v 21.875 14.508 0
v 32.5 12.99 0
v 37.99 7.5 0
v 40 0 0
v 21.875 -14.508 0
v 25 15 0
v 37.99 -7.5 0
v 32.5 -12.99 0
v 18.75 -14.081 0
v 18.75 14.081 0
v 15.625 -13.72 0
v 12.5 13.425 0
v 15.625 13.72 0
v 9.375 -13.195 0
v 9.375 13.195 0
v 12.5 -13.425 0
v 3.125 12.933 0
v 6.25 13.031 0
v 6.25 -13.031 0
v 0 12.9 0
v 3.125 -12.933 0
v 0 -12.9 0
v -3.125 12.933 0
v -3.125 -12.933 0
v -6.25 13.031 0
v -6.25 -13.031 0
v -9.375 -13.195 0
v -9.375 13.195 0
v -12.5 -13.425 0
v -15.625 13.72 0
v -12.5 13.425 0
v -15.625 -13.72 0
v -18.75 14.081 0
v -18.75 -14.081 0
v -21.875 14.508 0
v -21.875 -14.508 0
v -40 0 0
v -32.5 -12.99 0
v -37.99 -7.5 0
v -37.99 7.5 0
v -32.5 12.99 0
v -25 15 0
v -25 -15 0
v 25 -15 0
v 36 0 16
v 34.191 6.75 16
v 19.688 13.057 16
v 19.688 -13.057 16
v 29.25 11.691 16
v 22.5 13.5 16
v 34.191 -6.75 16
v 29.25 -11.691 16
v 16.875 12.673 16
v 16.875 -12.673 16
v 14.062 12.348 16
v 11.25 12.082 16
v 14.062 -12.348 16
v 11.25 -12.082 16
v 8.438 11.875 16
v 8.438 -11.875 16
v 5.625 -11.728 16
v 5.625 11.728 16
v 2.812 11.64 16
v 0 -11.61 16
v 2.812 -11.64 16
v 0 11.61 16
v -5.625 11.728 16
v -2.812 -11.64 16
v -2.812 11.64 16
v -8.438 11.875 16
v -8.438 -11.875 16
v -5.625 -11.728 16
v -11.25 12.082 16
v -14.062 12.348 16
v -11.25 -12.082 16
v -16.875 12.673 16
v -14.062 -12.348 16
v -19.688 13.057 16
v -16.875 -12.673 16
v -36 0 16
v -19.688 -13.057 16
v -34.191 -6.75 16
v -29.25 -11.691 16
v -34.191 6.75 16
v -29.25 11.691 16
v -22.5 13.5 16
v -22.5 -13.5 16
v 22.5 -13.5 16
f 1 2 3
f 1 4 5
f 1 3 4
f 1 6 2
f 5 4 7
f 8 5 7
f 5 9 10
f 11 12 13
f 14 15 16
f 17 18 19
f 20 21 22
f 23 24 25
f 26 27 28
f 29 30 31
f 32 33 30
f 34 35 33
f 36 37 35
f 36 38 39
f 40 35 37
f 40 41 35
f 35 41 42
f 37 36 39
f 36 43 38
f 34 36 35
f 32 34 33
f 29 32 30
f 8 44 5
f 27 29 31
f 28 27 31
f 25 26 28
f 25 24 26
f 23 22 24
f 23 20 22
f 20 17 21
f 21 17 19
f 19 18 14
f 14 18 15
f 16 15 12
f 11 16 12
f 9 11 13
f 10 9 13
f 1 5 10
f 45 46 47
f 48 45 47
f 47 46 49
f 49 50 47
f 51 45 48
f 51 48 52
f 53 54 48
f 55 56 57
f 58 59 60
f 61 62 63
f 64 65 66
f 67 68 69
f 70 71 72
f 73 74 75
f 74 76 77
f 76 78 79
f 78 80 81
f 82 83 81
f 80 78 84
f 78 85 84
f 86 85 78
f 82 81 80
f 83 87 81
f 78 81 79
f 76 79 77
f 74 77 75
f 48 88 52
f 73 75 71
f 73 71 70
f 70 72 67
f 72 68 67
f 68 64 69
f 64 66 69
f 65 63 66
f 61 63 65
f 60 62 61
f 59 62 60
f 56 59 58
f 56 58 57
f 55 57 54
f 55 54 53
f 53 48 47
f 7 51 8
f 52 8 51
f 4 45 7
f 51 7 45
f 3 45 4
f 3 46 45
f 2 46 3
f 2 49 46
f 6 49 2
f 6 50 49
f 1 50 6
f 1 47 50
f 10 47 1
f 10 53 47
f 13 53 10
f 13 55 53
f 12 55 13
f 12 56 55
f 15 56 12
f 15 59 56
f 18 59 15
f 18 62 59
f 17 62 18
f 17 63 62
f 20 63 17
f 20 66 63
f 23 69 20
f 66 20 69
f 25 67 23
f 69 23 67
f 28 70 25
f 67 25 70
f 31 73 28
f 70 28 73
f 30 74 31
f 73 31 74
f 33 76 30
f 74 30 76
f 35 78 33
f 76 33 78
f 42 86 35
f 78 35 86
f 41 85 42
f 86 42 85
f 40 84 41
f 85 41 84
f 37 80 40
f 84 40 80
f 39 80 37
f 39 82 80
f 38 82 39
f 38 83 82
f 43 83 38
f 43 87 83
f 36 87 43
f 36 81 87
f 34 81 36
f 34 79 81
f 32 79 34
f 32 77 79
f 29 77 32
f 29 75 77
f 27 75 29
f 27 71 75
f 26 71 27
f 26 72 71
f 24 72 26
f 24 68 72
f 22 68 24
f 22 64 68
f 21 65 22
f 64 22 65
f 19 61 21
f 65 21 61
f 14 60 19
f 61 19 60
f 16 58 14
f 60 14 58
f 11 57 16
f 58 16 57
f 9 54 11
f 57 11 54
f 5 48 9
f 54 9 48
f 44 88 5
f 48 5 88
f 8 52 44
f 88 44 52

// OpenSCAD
$fn = 32;

// ----------------------------------------------------------------------
// Handle: 80 x 30 mm grip, 16 mm thick
// ----------------------------------------------------------------------

// --- parameters (mm) ---
length = 80;              // grip length
width = 30;               // grip width
thickness = 16;           // grip thickness
waist = 0.86;             // width factor at the middle
draft = 0.9;              // top face scale of the extrusion

/* ergonomic grip outline, closed spline-like polygon in the XY plane */
grip = [[-25, 15], [-21.875, 14.508], [-18.75, 14.081], [-15.625, 13.72], [-12.5, 13.425], [-9.375, 13.195], [-6.25, 13.031], [-3.125, 12.933], [0, 12.9], [3.125, 12.933], [6.25, 13.031], [9.375, 13.195], [12.5, 13.425], [15.625, 13.72], [18.75, 14.081], [21.875, 14.508], [25, 15], [32.5, 12.99], [37.99, 7.5], [40, 0], [37.99, -7.5], [32.5, -12.99], [25, -15], [25, -15], [21.875, -14.508], [18.75, -14.081], [15.625, -13.72], [12.5, -13.425], [9.375, -13.195], [6.25, -13.031], [3.125, -12.933], [0, -12.9], [-3.125, -12.933], [-6.25, -13.031], [-9.375, -13.195], [-12.5, -13.425], [-15.625, -13.72], [-18.75, -14.081], [-21.875, -14.508], [-25, -15], [-32.5, -12.99], [-37.99, -7.5], [-40, 0], [-37.99, 7.5], [-32.5, 12.99], [-25, 15]];

module grip_body() {
  linear_extrude(height = thickness, scale = draft) polygon(grip);
}

difference() {
  union() {
    grip_body();
  }
}
